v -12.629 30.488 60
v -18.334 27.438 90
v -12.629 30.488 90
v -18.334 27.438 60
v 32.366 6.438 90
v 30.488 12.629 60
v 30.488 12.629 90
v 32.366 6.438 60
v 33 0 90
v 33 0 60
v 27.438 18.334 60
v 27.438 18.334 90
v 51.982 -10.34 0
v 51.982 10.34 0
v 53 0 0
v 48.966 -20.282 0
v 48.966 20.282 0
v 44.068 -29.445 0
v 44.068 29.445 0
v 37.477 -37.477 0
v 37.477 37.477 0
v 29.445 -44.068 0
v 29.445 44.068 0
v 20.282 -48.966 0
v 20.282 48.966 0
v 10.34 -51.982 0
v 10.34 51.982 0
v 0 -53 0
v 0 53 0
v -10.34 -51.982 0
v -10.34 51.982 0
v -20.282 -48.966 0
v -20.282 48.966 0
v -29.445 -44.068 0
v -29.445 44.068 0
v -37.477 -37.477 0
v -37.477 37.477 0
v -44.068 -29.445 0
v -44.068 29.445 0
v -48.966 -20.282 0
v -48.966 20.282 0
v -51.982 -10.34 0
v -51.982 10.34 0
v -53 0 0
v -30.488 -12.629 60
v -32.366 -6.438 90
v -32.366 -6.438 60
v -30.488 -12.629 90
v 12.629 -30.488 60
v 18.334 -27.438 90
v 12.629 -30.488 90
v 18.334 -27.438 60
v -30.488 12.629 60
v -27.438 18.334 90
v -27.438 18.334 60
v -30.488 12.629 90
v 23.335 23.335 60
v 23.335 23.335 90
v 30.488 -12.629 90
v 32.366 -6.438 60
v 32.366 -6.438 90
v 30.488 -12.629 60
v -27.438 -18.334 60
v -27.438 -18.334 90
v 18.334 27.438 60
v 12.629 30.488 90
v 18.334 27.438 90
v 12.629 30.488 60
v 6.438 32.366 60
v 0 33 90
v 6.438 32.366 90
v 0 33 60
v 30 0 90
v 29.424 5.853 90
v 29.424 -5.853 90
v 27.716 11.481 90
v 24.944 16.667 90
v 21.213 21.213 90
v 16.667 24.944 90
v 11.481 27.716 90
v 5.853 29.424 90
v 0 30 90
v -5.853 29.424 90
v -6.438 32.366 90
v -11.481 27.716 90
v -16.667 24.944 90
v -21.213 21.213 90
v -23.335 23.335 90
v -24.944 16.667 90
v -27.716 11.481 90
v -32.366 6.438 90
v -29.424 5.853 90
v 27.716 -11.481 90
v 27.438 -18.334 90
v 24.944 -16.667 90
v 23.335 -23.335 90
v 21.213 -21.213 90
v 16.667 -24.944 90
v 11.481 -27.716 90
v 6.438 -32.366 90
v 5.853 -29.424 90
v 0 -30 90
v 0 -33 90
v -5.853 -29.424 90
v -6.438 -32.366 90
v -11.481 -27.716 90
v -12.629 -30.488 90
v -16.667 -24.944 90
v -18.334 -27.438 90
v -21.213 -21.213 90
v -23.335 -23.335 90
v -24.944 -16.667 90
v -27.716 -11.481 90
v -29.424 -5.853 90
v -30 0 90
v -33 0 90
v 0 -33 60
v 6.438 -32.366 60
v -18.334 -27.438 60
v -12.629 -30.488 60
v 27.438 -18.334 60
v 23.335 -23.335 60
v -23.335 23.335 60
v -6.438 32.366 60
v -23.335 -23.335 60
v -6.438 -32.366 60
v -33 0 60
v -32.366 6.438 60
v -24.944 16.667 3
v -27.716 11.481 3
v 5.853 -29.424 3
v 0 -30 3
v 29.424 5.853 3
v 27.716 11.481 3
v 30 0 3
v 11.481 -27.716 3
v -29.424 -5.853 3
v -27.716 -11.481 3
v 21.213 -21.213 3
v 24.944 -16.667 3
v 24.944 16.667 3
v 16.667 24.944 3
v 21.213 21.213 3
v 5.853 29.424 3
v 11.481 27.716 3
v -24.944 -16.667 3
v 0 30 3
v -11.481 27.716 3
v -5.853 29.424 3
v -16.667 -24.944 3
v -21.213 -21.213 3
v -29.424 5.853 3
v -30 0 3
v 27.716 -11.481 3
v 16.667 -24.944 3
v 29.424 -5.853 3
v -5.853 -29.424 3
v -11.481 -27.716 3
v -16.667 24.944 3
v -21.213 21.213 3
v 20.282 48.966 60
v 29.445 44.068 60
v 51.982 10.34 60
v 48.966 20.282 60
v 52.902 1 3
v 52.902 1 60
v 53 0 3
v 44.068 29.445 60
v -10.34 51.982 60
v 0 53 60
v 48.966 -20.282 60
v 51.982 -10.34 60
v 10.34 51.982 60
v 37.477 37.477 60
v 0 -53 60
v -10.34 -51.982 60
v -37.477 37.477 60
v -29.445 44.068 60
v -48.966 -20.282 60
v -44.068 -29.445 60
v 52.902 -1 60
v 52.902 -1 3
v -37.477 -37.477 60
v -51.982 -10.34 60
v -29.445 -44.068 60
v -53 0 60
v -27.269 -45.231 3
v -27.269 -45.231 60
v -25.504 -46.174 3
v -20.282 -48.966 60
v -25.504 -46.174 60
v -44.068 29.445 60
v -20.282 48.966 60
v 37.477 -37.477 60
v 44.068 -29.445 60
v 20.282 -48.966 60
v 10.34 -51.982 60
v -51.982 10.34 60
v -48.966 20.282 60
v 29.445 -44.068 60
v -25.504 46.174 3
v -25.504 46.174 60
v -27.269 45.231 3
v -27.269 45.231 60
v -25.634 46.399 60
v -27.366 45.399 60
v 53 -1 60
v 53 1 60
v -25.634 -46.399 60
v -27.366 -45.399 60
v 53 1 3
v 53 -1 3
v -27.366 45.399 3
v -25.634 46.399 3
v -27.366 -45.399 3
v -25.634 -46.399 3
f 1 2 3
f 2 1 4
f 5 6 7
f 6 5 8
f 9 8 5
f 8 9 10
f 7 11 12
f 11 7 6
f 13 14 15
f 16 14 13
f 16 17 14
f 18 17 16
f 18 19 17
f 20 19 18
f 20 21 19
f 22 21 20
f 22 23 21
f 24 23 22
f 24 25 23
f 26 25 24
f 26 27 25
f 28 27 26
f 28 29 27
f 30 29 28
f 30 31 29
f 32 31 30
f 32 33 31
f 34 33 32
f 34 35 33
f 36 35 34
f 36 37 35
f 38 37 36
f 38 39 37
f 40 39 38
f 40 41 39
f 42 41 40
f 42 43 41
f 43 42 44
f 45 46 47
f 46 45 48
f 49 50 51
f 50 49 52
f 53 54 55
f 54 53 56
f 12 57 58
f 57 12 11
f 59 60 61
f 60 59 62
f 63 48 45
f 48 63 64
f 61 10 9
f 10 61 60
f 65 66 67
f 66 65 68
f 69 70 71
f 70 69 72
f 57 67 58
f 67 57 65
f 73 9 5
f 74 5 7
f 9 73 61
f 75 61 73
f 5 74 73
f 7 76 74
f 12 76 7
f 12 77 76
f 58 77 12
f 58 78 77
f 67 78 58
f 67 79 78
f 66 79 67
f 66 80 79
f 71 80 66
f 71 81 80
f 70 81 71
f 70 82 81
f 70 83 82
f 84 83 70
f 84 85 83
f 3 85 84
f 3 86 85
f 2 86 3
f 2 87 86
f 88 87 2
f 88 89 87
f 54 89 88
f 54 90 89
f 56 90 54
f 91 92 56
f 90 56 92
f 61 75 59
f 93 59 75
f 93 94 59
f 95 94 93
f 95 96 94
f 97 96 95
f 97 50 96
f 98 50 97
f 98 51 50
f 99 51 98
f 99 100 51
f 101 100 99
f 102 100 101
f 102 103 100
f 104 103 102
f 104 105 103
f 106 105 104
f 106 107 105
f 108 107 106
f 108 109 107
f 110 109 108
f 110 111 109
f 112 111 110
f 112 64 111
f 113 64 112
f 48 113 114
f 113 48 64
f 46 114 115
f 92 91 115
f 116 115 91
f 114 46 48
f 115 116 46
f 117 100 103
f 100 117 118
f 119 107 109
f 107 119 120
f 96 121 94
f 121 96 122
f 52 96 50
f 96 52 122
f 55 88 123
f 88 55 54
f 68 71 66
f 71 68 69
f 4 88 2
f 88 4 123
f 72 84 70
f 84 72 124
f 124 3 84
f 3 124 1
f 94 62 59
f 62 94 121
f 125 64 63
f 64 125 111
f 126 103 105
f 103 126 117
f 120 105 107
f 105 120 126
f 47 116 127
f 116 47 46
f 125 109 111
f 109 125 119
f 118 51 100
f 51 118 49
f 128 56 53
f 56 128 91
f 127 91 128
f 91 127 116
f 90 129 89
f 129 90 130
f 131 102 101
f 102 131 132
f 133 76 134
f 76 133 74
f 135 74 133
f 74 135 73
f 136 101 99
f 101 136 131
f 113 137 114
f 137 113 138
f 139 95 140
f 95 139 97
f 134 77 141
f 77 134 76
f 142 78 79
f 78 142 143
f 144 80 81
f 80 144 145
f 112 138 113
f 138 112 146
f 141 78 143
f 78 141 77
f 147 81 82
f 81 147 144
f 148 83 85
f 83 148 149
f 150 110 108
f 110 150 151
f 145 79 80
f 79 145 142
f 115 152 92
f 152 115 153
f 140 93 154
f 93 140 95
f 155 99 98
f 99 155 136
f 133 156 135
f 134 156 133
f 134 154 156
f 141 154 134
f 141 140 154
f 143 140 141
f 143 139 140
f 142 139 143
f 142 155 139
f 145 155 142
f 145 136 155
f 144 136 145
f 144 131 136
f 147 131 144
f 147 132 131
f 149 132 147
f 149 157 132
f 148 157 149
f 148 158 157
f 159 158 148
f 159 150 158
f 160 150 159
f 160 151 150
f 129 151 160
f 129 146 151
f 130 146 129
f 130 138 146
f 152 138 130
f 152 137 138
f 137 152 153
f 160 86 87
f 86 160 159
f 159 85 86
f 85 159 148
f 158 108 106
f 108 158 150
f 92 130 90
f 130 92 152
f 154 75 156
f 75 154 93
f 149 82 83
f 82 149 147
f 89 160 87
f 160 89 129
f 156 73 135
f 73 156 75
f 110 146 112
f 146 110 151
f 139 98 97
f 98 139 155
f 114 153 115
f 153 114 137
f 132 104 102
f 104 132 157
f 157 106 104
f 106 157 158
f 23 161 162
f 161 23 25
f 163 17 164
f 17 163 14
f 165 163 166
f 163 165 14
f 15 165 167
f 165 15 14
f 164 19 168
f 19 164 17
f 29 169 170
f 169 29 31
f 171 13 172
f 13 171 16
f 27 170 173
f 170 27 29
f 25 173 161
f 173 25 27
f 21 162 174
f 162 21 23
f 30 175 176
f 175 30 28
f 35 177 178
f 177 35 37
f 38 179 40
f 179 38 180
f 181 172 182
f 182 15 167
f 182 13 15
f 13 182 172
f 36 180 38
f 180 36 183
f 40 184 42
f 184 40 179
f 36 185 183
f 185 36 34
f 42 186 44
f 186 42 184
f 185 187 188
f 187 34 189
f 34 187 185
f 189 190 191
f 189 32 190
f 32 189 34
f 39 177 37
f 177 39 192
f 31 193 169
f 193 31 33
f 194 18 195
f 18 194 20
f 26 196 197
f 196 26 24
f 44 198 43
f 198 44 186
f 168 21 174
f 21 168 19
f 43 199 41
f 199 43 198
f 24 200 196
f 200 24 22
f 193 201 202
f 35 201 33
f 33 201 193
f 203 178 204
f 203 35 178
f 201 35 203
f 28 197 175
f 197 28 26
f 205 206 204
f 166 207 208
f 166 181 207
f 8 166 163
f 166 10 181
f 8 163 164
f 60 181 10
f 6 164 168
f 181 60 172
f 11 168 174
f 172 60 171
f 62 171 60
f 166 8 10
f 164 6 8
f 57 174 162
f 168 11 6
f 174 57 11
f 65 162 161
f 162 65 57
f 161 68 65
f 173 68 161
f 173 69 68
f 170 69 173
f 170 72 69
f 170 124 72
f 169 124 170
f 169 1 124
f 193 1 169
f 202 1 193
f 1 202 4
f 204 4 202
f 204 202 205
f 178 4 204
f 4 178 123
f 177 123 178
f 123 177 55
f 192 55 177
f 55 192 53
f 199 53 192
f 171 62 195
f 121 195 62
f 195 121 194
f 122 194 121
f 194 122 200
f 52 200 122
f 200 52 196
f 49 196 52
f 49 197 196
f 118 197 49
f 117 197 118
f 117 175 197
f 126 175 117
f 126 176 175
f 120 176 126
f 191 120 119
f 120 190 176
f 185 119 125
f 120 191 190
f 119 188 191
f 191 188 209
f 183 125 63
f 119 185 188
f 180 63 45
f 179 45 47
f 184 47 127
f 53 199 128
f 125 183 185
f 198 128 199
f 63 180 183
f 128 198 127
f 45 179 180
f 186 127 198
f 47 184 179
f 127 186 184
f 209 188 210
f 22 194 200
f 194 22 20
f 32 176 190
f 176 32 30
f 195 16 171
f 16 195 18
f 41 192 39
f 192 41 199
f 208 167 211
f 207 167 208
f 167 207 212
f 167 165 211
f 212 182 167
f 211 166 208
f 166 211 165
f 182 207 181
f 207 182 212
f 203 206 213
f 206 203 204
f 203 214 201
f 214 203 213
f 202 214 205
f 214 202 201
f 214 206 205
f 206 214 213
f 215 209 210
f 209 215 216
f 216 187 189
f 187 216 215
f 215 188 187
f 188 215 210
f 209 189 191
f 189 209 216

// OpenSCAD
// Stiftköcher mit geschlossenem Innenbecher + geschlossenem Außenring mit Fächern
// Version 2.3

// --- Parameter ---
inner_diameter       = 60;   // Durchmesser des inneren Hauptfachs (mm)
inner_height         = 90;   // Höhe des inneren Hauptfachs (mm)

outer_ring_width     = 20;   // Breite des äußeren Ringes (mm)
outer_height         = 60;   // Höhe der äußeren Fächer + äußerer Rand (mm)

wall_thickness       = 3;    // Wandstärke (innen und außen)
bottom_thickness     = 3;    // Bodenstärke (mm)

outer_compartments   = 3;   // Anzahl der schmalen Außenfächer
outer_wall_thickness = 2;    // Dicke der Zwischenwände außen (mm)

$fn = 32; // Glätte für Rundungen

// --- Hauptmodul ---
module pen_holder() {
    inner_r = inner_diameter/2;
    outer_r_in  = inner_r + wall_thickness;
    outer_r_out = outer_r_in + outer_ring_width;

    // 1) Innenbecher mit geschlossenem Rand
    difference() {
        cylinder(h = inner_height, r = inner_r + wall_thickness);
        translate([0,0,bottom_thickness])
            cylinder(h = inner_height - bottom_thickness, r = inner_r);
    }

    // 2) Geschlossener Außenring
    difference() {
        cylinder(h = outer_height, r = outer_r_out);
        translate([0,0,bottom_thickness])
            cylinder(h = outer_height - bottom_thickness, r = outer_r_in);
    }

    // 3) Radiale Trennwände im Außenring
    for (i = [0:outer_compartments-1]) {
        angle = 360/outer_compartments * i;
        rotate([0,0,angle])
            translate([outer_r_in, -outer_wall_thickness/2, bottom_thickness])
                cube([outer_ring_width, outer_wall_thickness, outer_height - bottom_thickness]);
    }
}

// --- Aufruf ---
pen_holder();
